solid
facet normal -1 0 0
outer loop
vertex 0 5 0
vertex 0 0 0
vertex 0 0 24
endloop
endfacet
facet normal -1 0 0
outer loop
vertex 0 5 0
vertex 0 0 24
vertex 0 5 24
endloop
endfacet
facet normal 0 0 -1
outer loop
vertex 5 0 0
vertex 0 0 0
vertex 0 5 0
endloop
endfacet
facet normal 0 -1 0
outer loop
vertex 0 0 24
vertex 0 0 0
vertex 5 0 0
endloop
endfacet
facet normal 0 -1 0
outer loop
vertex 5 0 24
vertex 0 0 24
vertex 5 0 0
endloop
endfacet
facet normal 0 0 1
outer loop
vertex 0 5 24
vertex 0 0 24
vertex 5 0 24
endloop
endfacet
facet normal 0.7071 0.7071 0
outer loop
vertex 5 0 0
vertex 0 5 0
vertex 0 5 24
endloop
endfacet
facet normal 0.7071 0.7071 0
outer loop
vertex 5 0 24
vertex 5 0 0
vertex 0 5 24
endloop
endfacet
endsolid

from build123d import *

# Parameters (mm, degrees)
SKETCH_1_W      = 5
SKETCH_1_H      = 5
EXTRUDE_1_DEPTH = 24
CHAMFER_1_SIZE  = 5


with BuildPart() as part:
    # ｽｹｯﾁ1 → ﾎﾞｽ - 押し出し1 (new body)
    with BuildSketch(Plane.XY):
        with Locations((2.5, 2.5)):
            Rectangle(SKETCH_1_W, SKETCH_1_H)
    extrude(amount=EXTRUDE_1_DEPTH)

    # 面取り1
    chamfer_1_edges = [part.edges().sort_by_distance(p)[0] for p in [
        (5, 5, 12),
    ]]
    chamfer(chamfer_1_edges, length=CHAMFER_1_SIZE - 0.0001)  # a hair under: the kernel refuses the full size


solid = part.part
